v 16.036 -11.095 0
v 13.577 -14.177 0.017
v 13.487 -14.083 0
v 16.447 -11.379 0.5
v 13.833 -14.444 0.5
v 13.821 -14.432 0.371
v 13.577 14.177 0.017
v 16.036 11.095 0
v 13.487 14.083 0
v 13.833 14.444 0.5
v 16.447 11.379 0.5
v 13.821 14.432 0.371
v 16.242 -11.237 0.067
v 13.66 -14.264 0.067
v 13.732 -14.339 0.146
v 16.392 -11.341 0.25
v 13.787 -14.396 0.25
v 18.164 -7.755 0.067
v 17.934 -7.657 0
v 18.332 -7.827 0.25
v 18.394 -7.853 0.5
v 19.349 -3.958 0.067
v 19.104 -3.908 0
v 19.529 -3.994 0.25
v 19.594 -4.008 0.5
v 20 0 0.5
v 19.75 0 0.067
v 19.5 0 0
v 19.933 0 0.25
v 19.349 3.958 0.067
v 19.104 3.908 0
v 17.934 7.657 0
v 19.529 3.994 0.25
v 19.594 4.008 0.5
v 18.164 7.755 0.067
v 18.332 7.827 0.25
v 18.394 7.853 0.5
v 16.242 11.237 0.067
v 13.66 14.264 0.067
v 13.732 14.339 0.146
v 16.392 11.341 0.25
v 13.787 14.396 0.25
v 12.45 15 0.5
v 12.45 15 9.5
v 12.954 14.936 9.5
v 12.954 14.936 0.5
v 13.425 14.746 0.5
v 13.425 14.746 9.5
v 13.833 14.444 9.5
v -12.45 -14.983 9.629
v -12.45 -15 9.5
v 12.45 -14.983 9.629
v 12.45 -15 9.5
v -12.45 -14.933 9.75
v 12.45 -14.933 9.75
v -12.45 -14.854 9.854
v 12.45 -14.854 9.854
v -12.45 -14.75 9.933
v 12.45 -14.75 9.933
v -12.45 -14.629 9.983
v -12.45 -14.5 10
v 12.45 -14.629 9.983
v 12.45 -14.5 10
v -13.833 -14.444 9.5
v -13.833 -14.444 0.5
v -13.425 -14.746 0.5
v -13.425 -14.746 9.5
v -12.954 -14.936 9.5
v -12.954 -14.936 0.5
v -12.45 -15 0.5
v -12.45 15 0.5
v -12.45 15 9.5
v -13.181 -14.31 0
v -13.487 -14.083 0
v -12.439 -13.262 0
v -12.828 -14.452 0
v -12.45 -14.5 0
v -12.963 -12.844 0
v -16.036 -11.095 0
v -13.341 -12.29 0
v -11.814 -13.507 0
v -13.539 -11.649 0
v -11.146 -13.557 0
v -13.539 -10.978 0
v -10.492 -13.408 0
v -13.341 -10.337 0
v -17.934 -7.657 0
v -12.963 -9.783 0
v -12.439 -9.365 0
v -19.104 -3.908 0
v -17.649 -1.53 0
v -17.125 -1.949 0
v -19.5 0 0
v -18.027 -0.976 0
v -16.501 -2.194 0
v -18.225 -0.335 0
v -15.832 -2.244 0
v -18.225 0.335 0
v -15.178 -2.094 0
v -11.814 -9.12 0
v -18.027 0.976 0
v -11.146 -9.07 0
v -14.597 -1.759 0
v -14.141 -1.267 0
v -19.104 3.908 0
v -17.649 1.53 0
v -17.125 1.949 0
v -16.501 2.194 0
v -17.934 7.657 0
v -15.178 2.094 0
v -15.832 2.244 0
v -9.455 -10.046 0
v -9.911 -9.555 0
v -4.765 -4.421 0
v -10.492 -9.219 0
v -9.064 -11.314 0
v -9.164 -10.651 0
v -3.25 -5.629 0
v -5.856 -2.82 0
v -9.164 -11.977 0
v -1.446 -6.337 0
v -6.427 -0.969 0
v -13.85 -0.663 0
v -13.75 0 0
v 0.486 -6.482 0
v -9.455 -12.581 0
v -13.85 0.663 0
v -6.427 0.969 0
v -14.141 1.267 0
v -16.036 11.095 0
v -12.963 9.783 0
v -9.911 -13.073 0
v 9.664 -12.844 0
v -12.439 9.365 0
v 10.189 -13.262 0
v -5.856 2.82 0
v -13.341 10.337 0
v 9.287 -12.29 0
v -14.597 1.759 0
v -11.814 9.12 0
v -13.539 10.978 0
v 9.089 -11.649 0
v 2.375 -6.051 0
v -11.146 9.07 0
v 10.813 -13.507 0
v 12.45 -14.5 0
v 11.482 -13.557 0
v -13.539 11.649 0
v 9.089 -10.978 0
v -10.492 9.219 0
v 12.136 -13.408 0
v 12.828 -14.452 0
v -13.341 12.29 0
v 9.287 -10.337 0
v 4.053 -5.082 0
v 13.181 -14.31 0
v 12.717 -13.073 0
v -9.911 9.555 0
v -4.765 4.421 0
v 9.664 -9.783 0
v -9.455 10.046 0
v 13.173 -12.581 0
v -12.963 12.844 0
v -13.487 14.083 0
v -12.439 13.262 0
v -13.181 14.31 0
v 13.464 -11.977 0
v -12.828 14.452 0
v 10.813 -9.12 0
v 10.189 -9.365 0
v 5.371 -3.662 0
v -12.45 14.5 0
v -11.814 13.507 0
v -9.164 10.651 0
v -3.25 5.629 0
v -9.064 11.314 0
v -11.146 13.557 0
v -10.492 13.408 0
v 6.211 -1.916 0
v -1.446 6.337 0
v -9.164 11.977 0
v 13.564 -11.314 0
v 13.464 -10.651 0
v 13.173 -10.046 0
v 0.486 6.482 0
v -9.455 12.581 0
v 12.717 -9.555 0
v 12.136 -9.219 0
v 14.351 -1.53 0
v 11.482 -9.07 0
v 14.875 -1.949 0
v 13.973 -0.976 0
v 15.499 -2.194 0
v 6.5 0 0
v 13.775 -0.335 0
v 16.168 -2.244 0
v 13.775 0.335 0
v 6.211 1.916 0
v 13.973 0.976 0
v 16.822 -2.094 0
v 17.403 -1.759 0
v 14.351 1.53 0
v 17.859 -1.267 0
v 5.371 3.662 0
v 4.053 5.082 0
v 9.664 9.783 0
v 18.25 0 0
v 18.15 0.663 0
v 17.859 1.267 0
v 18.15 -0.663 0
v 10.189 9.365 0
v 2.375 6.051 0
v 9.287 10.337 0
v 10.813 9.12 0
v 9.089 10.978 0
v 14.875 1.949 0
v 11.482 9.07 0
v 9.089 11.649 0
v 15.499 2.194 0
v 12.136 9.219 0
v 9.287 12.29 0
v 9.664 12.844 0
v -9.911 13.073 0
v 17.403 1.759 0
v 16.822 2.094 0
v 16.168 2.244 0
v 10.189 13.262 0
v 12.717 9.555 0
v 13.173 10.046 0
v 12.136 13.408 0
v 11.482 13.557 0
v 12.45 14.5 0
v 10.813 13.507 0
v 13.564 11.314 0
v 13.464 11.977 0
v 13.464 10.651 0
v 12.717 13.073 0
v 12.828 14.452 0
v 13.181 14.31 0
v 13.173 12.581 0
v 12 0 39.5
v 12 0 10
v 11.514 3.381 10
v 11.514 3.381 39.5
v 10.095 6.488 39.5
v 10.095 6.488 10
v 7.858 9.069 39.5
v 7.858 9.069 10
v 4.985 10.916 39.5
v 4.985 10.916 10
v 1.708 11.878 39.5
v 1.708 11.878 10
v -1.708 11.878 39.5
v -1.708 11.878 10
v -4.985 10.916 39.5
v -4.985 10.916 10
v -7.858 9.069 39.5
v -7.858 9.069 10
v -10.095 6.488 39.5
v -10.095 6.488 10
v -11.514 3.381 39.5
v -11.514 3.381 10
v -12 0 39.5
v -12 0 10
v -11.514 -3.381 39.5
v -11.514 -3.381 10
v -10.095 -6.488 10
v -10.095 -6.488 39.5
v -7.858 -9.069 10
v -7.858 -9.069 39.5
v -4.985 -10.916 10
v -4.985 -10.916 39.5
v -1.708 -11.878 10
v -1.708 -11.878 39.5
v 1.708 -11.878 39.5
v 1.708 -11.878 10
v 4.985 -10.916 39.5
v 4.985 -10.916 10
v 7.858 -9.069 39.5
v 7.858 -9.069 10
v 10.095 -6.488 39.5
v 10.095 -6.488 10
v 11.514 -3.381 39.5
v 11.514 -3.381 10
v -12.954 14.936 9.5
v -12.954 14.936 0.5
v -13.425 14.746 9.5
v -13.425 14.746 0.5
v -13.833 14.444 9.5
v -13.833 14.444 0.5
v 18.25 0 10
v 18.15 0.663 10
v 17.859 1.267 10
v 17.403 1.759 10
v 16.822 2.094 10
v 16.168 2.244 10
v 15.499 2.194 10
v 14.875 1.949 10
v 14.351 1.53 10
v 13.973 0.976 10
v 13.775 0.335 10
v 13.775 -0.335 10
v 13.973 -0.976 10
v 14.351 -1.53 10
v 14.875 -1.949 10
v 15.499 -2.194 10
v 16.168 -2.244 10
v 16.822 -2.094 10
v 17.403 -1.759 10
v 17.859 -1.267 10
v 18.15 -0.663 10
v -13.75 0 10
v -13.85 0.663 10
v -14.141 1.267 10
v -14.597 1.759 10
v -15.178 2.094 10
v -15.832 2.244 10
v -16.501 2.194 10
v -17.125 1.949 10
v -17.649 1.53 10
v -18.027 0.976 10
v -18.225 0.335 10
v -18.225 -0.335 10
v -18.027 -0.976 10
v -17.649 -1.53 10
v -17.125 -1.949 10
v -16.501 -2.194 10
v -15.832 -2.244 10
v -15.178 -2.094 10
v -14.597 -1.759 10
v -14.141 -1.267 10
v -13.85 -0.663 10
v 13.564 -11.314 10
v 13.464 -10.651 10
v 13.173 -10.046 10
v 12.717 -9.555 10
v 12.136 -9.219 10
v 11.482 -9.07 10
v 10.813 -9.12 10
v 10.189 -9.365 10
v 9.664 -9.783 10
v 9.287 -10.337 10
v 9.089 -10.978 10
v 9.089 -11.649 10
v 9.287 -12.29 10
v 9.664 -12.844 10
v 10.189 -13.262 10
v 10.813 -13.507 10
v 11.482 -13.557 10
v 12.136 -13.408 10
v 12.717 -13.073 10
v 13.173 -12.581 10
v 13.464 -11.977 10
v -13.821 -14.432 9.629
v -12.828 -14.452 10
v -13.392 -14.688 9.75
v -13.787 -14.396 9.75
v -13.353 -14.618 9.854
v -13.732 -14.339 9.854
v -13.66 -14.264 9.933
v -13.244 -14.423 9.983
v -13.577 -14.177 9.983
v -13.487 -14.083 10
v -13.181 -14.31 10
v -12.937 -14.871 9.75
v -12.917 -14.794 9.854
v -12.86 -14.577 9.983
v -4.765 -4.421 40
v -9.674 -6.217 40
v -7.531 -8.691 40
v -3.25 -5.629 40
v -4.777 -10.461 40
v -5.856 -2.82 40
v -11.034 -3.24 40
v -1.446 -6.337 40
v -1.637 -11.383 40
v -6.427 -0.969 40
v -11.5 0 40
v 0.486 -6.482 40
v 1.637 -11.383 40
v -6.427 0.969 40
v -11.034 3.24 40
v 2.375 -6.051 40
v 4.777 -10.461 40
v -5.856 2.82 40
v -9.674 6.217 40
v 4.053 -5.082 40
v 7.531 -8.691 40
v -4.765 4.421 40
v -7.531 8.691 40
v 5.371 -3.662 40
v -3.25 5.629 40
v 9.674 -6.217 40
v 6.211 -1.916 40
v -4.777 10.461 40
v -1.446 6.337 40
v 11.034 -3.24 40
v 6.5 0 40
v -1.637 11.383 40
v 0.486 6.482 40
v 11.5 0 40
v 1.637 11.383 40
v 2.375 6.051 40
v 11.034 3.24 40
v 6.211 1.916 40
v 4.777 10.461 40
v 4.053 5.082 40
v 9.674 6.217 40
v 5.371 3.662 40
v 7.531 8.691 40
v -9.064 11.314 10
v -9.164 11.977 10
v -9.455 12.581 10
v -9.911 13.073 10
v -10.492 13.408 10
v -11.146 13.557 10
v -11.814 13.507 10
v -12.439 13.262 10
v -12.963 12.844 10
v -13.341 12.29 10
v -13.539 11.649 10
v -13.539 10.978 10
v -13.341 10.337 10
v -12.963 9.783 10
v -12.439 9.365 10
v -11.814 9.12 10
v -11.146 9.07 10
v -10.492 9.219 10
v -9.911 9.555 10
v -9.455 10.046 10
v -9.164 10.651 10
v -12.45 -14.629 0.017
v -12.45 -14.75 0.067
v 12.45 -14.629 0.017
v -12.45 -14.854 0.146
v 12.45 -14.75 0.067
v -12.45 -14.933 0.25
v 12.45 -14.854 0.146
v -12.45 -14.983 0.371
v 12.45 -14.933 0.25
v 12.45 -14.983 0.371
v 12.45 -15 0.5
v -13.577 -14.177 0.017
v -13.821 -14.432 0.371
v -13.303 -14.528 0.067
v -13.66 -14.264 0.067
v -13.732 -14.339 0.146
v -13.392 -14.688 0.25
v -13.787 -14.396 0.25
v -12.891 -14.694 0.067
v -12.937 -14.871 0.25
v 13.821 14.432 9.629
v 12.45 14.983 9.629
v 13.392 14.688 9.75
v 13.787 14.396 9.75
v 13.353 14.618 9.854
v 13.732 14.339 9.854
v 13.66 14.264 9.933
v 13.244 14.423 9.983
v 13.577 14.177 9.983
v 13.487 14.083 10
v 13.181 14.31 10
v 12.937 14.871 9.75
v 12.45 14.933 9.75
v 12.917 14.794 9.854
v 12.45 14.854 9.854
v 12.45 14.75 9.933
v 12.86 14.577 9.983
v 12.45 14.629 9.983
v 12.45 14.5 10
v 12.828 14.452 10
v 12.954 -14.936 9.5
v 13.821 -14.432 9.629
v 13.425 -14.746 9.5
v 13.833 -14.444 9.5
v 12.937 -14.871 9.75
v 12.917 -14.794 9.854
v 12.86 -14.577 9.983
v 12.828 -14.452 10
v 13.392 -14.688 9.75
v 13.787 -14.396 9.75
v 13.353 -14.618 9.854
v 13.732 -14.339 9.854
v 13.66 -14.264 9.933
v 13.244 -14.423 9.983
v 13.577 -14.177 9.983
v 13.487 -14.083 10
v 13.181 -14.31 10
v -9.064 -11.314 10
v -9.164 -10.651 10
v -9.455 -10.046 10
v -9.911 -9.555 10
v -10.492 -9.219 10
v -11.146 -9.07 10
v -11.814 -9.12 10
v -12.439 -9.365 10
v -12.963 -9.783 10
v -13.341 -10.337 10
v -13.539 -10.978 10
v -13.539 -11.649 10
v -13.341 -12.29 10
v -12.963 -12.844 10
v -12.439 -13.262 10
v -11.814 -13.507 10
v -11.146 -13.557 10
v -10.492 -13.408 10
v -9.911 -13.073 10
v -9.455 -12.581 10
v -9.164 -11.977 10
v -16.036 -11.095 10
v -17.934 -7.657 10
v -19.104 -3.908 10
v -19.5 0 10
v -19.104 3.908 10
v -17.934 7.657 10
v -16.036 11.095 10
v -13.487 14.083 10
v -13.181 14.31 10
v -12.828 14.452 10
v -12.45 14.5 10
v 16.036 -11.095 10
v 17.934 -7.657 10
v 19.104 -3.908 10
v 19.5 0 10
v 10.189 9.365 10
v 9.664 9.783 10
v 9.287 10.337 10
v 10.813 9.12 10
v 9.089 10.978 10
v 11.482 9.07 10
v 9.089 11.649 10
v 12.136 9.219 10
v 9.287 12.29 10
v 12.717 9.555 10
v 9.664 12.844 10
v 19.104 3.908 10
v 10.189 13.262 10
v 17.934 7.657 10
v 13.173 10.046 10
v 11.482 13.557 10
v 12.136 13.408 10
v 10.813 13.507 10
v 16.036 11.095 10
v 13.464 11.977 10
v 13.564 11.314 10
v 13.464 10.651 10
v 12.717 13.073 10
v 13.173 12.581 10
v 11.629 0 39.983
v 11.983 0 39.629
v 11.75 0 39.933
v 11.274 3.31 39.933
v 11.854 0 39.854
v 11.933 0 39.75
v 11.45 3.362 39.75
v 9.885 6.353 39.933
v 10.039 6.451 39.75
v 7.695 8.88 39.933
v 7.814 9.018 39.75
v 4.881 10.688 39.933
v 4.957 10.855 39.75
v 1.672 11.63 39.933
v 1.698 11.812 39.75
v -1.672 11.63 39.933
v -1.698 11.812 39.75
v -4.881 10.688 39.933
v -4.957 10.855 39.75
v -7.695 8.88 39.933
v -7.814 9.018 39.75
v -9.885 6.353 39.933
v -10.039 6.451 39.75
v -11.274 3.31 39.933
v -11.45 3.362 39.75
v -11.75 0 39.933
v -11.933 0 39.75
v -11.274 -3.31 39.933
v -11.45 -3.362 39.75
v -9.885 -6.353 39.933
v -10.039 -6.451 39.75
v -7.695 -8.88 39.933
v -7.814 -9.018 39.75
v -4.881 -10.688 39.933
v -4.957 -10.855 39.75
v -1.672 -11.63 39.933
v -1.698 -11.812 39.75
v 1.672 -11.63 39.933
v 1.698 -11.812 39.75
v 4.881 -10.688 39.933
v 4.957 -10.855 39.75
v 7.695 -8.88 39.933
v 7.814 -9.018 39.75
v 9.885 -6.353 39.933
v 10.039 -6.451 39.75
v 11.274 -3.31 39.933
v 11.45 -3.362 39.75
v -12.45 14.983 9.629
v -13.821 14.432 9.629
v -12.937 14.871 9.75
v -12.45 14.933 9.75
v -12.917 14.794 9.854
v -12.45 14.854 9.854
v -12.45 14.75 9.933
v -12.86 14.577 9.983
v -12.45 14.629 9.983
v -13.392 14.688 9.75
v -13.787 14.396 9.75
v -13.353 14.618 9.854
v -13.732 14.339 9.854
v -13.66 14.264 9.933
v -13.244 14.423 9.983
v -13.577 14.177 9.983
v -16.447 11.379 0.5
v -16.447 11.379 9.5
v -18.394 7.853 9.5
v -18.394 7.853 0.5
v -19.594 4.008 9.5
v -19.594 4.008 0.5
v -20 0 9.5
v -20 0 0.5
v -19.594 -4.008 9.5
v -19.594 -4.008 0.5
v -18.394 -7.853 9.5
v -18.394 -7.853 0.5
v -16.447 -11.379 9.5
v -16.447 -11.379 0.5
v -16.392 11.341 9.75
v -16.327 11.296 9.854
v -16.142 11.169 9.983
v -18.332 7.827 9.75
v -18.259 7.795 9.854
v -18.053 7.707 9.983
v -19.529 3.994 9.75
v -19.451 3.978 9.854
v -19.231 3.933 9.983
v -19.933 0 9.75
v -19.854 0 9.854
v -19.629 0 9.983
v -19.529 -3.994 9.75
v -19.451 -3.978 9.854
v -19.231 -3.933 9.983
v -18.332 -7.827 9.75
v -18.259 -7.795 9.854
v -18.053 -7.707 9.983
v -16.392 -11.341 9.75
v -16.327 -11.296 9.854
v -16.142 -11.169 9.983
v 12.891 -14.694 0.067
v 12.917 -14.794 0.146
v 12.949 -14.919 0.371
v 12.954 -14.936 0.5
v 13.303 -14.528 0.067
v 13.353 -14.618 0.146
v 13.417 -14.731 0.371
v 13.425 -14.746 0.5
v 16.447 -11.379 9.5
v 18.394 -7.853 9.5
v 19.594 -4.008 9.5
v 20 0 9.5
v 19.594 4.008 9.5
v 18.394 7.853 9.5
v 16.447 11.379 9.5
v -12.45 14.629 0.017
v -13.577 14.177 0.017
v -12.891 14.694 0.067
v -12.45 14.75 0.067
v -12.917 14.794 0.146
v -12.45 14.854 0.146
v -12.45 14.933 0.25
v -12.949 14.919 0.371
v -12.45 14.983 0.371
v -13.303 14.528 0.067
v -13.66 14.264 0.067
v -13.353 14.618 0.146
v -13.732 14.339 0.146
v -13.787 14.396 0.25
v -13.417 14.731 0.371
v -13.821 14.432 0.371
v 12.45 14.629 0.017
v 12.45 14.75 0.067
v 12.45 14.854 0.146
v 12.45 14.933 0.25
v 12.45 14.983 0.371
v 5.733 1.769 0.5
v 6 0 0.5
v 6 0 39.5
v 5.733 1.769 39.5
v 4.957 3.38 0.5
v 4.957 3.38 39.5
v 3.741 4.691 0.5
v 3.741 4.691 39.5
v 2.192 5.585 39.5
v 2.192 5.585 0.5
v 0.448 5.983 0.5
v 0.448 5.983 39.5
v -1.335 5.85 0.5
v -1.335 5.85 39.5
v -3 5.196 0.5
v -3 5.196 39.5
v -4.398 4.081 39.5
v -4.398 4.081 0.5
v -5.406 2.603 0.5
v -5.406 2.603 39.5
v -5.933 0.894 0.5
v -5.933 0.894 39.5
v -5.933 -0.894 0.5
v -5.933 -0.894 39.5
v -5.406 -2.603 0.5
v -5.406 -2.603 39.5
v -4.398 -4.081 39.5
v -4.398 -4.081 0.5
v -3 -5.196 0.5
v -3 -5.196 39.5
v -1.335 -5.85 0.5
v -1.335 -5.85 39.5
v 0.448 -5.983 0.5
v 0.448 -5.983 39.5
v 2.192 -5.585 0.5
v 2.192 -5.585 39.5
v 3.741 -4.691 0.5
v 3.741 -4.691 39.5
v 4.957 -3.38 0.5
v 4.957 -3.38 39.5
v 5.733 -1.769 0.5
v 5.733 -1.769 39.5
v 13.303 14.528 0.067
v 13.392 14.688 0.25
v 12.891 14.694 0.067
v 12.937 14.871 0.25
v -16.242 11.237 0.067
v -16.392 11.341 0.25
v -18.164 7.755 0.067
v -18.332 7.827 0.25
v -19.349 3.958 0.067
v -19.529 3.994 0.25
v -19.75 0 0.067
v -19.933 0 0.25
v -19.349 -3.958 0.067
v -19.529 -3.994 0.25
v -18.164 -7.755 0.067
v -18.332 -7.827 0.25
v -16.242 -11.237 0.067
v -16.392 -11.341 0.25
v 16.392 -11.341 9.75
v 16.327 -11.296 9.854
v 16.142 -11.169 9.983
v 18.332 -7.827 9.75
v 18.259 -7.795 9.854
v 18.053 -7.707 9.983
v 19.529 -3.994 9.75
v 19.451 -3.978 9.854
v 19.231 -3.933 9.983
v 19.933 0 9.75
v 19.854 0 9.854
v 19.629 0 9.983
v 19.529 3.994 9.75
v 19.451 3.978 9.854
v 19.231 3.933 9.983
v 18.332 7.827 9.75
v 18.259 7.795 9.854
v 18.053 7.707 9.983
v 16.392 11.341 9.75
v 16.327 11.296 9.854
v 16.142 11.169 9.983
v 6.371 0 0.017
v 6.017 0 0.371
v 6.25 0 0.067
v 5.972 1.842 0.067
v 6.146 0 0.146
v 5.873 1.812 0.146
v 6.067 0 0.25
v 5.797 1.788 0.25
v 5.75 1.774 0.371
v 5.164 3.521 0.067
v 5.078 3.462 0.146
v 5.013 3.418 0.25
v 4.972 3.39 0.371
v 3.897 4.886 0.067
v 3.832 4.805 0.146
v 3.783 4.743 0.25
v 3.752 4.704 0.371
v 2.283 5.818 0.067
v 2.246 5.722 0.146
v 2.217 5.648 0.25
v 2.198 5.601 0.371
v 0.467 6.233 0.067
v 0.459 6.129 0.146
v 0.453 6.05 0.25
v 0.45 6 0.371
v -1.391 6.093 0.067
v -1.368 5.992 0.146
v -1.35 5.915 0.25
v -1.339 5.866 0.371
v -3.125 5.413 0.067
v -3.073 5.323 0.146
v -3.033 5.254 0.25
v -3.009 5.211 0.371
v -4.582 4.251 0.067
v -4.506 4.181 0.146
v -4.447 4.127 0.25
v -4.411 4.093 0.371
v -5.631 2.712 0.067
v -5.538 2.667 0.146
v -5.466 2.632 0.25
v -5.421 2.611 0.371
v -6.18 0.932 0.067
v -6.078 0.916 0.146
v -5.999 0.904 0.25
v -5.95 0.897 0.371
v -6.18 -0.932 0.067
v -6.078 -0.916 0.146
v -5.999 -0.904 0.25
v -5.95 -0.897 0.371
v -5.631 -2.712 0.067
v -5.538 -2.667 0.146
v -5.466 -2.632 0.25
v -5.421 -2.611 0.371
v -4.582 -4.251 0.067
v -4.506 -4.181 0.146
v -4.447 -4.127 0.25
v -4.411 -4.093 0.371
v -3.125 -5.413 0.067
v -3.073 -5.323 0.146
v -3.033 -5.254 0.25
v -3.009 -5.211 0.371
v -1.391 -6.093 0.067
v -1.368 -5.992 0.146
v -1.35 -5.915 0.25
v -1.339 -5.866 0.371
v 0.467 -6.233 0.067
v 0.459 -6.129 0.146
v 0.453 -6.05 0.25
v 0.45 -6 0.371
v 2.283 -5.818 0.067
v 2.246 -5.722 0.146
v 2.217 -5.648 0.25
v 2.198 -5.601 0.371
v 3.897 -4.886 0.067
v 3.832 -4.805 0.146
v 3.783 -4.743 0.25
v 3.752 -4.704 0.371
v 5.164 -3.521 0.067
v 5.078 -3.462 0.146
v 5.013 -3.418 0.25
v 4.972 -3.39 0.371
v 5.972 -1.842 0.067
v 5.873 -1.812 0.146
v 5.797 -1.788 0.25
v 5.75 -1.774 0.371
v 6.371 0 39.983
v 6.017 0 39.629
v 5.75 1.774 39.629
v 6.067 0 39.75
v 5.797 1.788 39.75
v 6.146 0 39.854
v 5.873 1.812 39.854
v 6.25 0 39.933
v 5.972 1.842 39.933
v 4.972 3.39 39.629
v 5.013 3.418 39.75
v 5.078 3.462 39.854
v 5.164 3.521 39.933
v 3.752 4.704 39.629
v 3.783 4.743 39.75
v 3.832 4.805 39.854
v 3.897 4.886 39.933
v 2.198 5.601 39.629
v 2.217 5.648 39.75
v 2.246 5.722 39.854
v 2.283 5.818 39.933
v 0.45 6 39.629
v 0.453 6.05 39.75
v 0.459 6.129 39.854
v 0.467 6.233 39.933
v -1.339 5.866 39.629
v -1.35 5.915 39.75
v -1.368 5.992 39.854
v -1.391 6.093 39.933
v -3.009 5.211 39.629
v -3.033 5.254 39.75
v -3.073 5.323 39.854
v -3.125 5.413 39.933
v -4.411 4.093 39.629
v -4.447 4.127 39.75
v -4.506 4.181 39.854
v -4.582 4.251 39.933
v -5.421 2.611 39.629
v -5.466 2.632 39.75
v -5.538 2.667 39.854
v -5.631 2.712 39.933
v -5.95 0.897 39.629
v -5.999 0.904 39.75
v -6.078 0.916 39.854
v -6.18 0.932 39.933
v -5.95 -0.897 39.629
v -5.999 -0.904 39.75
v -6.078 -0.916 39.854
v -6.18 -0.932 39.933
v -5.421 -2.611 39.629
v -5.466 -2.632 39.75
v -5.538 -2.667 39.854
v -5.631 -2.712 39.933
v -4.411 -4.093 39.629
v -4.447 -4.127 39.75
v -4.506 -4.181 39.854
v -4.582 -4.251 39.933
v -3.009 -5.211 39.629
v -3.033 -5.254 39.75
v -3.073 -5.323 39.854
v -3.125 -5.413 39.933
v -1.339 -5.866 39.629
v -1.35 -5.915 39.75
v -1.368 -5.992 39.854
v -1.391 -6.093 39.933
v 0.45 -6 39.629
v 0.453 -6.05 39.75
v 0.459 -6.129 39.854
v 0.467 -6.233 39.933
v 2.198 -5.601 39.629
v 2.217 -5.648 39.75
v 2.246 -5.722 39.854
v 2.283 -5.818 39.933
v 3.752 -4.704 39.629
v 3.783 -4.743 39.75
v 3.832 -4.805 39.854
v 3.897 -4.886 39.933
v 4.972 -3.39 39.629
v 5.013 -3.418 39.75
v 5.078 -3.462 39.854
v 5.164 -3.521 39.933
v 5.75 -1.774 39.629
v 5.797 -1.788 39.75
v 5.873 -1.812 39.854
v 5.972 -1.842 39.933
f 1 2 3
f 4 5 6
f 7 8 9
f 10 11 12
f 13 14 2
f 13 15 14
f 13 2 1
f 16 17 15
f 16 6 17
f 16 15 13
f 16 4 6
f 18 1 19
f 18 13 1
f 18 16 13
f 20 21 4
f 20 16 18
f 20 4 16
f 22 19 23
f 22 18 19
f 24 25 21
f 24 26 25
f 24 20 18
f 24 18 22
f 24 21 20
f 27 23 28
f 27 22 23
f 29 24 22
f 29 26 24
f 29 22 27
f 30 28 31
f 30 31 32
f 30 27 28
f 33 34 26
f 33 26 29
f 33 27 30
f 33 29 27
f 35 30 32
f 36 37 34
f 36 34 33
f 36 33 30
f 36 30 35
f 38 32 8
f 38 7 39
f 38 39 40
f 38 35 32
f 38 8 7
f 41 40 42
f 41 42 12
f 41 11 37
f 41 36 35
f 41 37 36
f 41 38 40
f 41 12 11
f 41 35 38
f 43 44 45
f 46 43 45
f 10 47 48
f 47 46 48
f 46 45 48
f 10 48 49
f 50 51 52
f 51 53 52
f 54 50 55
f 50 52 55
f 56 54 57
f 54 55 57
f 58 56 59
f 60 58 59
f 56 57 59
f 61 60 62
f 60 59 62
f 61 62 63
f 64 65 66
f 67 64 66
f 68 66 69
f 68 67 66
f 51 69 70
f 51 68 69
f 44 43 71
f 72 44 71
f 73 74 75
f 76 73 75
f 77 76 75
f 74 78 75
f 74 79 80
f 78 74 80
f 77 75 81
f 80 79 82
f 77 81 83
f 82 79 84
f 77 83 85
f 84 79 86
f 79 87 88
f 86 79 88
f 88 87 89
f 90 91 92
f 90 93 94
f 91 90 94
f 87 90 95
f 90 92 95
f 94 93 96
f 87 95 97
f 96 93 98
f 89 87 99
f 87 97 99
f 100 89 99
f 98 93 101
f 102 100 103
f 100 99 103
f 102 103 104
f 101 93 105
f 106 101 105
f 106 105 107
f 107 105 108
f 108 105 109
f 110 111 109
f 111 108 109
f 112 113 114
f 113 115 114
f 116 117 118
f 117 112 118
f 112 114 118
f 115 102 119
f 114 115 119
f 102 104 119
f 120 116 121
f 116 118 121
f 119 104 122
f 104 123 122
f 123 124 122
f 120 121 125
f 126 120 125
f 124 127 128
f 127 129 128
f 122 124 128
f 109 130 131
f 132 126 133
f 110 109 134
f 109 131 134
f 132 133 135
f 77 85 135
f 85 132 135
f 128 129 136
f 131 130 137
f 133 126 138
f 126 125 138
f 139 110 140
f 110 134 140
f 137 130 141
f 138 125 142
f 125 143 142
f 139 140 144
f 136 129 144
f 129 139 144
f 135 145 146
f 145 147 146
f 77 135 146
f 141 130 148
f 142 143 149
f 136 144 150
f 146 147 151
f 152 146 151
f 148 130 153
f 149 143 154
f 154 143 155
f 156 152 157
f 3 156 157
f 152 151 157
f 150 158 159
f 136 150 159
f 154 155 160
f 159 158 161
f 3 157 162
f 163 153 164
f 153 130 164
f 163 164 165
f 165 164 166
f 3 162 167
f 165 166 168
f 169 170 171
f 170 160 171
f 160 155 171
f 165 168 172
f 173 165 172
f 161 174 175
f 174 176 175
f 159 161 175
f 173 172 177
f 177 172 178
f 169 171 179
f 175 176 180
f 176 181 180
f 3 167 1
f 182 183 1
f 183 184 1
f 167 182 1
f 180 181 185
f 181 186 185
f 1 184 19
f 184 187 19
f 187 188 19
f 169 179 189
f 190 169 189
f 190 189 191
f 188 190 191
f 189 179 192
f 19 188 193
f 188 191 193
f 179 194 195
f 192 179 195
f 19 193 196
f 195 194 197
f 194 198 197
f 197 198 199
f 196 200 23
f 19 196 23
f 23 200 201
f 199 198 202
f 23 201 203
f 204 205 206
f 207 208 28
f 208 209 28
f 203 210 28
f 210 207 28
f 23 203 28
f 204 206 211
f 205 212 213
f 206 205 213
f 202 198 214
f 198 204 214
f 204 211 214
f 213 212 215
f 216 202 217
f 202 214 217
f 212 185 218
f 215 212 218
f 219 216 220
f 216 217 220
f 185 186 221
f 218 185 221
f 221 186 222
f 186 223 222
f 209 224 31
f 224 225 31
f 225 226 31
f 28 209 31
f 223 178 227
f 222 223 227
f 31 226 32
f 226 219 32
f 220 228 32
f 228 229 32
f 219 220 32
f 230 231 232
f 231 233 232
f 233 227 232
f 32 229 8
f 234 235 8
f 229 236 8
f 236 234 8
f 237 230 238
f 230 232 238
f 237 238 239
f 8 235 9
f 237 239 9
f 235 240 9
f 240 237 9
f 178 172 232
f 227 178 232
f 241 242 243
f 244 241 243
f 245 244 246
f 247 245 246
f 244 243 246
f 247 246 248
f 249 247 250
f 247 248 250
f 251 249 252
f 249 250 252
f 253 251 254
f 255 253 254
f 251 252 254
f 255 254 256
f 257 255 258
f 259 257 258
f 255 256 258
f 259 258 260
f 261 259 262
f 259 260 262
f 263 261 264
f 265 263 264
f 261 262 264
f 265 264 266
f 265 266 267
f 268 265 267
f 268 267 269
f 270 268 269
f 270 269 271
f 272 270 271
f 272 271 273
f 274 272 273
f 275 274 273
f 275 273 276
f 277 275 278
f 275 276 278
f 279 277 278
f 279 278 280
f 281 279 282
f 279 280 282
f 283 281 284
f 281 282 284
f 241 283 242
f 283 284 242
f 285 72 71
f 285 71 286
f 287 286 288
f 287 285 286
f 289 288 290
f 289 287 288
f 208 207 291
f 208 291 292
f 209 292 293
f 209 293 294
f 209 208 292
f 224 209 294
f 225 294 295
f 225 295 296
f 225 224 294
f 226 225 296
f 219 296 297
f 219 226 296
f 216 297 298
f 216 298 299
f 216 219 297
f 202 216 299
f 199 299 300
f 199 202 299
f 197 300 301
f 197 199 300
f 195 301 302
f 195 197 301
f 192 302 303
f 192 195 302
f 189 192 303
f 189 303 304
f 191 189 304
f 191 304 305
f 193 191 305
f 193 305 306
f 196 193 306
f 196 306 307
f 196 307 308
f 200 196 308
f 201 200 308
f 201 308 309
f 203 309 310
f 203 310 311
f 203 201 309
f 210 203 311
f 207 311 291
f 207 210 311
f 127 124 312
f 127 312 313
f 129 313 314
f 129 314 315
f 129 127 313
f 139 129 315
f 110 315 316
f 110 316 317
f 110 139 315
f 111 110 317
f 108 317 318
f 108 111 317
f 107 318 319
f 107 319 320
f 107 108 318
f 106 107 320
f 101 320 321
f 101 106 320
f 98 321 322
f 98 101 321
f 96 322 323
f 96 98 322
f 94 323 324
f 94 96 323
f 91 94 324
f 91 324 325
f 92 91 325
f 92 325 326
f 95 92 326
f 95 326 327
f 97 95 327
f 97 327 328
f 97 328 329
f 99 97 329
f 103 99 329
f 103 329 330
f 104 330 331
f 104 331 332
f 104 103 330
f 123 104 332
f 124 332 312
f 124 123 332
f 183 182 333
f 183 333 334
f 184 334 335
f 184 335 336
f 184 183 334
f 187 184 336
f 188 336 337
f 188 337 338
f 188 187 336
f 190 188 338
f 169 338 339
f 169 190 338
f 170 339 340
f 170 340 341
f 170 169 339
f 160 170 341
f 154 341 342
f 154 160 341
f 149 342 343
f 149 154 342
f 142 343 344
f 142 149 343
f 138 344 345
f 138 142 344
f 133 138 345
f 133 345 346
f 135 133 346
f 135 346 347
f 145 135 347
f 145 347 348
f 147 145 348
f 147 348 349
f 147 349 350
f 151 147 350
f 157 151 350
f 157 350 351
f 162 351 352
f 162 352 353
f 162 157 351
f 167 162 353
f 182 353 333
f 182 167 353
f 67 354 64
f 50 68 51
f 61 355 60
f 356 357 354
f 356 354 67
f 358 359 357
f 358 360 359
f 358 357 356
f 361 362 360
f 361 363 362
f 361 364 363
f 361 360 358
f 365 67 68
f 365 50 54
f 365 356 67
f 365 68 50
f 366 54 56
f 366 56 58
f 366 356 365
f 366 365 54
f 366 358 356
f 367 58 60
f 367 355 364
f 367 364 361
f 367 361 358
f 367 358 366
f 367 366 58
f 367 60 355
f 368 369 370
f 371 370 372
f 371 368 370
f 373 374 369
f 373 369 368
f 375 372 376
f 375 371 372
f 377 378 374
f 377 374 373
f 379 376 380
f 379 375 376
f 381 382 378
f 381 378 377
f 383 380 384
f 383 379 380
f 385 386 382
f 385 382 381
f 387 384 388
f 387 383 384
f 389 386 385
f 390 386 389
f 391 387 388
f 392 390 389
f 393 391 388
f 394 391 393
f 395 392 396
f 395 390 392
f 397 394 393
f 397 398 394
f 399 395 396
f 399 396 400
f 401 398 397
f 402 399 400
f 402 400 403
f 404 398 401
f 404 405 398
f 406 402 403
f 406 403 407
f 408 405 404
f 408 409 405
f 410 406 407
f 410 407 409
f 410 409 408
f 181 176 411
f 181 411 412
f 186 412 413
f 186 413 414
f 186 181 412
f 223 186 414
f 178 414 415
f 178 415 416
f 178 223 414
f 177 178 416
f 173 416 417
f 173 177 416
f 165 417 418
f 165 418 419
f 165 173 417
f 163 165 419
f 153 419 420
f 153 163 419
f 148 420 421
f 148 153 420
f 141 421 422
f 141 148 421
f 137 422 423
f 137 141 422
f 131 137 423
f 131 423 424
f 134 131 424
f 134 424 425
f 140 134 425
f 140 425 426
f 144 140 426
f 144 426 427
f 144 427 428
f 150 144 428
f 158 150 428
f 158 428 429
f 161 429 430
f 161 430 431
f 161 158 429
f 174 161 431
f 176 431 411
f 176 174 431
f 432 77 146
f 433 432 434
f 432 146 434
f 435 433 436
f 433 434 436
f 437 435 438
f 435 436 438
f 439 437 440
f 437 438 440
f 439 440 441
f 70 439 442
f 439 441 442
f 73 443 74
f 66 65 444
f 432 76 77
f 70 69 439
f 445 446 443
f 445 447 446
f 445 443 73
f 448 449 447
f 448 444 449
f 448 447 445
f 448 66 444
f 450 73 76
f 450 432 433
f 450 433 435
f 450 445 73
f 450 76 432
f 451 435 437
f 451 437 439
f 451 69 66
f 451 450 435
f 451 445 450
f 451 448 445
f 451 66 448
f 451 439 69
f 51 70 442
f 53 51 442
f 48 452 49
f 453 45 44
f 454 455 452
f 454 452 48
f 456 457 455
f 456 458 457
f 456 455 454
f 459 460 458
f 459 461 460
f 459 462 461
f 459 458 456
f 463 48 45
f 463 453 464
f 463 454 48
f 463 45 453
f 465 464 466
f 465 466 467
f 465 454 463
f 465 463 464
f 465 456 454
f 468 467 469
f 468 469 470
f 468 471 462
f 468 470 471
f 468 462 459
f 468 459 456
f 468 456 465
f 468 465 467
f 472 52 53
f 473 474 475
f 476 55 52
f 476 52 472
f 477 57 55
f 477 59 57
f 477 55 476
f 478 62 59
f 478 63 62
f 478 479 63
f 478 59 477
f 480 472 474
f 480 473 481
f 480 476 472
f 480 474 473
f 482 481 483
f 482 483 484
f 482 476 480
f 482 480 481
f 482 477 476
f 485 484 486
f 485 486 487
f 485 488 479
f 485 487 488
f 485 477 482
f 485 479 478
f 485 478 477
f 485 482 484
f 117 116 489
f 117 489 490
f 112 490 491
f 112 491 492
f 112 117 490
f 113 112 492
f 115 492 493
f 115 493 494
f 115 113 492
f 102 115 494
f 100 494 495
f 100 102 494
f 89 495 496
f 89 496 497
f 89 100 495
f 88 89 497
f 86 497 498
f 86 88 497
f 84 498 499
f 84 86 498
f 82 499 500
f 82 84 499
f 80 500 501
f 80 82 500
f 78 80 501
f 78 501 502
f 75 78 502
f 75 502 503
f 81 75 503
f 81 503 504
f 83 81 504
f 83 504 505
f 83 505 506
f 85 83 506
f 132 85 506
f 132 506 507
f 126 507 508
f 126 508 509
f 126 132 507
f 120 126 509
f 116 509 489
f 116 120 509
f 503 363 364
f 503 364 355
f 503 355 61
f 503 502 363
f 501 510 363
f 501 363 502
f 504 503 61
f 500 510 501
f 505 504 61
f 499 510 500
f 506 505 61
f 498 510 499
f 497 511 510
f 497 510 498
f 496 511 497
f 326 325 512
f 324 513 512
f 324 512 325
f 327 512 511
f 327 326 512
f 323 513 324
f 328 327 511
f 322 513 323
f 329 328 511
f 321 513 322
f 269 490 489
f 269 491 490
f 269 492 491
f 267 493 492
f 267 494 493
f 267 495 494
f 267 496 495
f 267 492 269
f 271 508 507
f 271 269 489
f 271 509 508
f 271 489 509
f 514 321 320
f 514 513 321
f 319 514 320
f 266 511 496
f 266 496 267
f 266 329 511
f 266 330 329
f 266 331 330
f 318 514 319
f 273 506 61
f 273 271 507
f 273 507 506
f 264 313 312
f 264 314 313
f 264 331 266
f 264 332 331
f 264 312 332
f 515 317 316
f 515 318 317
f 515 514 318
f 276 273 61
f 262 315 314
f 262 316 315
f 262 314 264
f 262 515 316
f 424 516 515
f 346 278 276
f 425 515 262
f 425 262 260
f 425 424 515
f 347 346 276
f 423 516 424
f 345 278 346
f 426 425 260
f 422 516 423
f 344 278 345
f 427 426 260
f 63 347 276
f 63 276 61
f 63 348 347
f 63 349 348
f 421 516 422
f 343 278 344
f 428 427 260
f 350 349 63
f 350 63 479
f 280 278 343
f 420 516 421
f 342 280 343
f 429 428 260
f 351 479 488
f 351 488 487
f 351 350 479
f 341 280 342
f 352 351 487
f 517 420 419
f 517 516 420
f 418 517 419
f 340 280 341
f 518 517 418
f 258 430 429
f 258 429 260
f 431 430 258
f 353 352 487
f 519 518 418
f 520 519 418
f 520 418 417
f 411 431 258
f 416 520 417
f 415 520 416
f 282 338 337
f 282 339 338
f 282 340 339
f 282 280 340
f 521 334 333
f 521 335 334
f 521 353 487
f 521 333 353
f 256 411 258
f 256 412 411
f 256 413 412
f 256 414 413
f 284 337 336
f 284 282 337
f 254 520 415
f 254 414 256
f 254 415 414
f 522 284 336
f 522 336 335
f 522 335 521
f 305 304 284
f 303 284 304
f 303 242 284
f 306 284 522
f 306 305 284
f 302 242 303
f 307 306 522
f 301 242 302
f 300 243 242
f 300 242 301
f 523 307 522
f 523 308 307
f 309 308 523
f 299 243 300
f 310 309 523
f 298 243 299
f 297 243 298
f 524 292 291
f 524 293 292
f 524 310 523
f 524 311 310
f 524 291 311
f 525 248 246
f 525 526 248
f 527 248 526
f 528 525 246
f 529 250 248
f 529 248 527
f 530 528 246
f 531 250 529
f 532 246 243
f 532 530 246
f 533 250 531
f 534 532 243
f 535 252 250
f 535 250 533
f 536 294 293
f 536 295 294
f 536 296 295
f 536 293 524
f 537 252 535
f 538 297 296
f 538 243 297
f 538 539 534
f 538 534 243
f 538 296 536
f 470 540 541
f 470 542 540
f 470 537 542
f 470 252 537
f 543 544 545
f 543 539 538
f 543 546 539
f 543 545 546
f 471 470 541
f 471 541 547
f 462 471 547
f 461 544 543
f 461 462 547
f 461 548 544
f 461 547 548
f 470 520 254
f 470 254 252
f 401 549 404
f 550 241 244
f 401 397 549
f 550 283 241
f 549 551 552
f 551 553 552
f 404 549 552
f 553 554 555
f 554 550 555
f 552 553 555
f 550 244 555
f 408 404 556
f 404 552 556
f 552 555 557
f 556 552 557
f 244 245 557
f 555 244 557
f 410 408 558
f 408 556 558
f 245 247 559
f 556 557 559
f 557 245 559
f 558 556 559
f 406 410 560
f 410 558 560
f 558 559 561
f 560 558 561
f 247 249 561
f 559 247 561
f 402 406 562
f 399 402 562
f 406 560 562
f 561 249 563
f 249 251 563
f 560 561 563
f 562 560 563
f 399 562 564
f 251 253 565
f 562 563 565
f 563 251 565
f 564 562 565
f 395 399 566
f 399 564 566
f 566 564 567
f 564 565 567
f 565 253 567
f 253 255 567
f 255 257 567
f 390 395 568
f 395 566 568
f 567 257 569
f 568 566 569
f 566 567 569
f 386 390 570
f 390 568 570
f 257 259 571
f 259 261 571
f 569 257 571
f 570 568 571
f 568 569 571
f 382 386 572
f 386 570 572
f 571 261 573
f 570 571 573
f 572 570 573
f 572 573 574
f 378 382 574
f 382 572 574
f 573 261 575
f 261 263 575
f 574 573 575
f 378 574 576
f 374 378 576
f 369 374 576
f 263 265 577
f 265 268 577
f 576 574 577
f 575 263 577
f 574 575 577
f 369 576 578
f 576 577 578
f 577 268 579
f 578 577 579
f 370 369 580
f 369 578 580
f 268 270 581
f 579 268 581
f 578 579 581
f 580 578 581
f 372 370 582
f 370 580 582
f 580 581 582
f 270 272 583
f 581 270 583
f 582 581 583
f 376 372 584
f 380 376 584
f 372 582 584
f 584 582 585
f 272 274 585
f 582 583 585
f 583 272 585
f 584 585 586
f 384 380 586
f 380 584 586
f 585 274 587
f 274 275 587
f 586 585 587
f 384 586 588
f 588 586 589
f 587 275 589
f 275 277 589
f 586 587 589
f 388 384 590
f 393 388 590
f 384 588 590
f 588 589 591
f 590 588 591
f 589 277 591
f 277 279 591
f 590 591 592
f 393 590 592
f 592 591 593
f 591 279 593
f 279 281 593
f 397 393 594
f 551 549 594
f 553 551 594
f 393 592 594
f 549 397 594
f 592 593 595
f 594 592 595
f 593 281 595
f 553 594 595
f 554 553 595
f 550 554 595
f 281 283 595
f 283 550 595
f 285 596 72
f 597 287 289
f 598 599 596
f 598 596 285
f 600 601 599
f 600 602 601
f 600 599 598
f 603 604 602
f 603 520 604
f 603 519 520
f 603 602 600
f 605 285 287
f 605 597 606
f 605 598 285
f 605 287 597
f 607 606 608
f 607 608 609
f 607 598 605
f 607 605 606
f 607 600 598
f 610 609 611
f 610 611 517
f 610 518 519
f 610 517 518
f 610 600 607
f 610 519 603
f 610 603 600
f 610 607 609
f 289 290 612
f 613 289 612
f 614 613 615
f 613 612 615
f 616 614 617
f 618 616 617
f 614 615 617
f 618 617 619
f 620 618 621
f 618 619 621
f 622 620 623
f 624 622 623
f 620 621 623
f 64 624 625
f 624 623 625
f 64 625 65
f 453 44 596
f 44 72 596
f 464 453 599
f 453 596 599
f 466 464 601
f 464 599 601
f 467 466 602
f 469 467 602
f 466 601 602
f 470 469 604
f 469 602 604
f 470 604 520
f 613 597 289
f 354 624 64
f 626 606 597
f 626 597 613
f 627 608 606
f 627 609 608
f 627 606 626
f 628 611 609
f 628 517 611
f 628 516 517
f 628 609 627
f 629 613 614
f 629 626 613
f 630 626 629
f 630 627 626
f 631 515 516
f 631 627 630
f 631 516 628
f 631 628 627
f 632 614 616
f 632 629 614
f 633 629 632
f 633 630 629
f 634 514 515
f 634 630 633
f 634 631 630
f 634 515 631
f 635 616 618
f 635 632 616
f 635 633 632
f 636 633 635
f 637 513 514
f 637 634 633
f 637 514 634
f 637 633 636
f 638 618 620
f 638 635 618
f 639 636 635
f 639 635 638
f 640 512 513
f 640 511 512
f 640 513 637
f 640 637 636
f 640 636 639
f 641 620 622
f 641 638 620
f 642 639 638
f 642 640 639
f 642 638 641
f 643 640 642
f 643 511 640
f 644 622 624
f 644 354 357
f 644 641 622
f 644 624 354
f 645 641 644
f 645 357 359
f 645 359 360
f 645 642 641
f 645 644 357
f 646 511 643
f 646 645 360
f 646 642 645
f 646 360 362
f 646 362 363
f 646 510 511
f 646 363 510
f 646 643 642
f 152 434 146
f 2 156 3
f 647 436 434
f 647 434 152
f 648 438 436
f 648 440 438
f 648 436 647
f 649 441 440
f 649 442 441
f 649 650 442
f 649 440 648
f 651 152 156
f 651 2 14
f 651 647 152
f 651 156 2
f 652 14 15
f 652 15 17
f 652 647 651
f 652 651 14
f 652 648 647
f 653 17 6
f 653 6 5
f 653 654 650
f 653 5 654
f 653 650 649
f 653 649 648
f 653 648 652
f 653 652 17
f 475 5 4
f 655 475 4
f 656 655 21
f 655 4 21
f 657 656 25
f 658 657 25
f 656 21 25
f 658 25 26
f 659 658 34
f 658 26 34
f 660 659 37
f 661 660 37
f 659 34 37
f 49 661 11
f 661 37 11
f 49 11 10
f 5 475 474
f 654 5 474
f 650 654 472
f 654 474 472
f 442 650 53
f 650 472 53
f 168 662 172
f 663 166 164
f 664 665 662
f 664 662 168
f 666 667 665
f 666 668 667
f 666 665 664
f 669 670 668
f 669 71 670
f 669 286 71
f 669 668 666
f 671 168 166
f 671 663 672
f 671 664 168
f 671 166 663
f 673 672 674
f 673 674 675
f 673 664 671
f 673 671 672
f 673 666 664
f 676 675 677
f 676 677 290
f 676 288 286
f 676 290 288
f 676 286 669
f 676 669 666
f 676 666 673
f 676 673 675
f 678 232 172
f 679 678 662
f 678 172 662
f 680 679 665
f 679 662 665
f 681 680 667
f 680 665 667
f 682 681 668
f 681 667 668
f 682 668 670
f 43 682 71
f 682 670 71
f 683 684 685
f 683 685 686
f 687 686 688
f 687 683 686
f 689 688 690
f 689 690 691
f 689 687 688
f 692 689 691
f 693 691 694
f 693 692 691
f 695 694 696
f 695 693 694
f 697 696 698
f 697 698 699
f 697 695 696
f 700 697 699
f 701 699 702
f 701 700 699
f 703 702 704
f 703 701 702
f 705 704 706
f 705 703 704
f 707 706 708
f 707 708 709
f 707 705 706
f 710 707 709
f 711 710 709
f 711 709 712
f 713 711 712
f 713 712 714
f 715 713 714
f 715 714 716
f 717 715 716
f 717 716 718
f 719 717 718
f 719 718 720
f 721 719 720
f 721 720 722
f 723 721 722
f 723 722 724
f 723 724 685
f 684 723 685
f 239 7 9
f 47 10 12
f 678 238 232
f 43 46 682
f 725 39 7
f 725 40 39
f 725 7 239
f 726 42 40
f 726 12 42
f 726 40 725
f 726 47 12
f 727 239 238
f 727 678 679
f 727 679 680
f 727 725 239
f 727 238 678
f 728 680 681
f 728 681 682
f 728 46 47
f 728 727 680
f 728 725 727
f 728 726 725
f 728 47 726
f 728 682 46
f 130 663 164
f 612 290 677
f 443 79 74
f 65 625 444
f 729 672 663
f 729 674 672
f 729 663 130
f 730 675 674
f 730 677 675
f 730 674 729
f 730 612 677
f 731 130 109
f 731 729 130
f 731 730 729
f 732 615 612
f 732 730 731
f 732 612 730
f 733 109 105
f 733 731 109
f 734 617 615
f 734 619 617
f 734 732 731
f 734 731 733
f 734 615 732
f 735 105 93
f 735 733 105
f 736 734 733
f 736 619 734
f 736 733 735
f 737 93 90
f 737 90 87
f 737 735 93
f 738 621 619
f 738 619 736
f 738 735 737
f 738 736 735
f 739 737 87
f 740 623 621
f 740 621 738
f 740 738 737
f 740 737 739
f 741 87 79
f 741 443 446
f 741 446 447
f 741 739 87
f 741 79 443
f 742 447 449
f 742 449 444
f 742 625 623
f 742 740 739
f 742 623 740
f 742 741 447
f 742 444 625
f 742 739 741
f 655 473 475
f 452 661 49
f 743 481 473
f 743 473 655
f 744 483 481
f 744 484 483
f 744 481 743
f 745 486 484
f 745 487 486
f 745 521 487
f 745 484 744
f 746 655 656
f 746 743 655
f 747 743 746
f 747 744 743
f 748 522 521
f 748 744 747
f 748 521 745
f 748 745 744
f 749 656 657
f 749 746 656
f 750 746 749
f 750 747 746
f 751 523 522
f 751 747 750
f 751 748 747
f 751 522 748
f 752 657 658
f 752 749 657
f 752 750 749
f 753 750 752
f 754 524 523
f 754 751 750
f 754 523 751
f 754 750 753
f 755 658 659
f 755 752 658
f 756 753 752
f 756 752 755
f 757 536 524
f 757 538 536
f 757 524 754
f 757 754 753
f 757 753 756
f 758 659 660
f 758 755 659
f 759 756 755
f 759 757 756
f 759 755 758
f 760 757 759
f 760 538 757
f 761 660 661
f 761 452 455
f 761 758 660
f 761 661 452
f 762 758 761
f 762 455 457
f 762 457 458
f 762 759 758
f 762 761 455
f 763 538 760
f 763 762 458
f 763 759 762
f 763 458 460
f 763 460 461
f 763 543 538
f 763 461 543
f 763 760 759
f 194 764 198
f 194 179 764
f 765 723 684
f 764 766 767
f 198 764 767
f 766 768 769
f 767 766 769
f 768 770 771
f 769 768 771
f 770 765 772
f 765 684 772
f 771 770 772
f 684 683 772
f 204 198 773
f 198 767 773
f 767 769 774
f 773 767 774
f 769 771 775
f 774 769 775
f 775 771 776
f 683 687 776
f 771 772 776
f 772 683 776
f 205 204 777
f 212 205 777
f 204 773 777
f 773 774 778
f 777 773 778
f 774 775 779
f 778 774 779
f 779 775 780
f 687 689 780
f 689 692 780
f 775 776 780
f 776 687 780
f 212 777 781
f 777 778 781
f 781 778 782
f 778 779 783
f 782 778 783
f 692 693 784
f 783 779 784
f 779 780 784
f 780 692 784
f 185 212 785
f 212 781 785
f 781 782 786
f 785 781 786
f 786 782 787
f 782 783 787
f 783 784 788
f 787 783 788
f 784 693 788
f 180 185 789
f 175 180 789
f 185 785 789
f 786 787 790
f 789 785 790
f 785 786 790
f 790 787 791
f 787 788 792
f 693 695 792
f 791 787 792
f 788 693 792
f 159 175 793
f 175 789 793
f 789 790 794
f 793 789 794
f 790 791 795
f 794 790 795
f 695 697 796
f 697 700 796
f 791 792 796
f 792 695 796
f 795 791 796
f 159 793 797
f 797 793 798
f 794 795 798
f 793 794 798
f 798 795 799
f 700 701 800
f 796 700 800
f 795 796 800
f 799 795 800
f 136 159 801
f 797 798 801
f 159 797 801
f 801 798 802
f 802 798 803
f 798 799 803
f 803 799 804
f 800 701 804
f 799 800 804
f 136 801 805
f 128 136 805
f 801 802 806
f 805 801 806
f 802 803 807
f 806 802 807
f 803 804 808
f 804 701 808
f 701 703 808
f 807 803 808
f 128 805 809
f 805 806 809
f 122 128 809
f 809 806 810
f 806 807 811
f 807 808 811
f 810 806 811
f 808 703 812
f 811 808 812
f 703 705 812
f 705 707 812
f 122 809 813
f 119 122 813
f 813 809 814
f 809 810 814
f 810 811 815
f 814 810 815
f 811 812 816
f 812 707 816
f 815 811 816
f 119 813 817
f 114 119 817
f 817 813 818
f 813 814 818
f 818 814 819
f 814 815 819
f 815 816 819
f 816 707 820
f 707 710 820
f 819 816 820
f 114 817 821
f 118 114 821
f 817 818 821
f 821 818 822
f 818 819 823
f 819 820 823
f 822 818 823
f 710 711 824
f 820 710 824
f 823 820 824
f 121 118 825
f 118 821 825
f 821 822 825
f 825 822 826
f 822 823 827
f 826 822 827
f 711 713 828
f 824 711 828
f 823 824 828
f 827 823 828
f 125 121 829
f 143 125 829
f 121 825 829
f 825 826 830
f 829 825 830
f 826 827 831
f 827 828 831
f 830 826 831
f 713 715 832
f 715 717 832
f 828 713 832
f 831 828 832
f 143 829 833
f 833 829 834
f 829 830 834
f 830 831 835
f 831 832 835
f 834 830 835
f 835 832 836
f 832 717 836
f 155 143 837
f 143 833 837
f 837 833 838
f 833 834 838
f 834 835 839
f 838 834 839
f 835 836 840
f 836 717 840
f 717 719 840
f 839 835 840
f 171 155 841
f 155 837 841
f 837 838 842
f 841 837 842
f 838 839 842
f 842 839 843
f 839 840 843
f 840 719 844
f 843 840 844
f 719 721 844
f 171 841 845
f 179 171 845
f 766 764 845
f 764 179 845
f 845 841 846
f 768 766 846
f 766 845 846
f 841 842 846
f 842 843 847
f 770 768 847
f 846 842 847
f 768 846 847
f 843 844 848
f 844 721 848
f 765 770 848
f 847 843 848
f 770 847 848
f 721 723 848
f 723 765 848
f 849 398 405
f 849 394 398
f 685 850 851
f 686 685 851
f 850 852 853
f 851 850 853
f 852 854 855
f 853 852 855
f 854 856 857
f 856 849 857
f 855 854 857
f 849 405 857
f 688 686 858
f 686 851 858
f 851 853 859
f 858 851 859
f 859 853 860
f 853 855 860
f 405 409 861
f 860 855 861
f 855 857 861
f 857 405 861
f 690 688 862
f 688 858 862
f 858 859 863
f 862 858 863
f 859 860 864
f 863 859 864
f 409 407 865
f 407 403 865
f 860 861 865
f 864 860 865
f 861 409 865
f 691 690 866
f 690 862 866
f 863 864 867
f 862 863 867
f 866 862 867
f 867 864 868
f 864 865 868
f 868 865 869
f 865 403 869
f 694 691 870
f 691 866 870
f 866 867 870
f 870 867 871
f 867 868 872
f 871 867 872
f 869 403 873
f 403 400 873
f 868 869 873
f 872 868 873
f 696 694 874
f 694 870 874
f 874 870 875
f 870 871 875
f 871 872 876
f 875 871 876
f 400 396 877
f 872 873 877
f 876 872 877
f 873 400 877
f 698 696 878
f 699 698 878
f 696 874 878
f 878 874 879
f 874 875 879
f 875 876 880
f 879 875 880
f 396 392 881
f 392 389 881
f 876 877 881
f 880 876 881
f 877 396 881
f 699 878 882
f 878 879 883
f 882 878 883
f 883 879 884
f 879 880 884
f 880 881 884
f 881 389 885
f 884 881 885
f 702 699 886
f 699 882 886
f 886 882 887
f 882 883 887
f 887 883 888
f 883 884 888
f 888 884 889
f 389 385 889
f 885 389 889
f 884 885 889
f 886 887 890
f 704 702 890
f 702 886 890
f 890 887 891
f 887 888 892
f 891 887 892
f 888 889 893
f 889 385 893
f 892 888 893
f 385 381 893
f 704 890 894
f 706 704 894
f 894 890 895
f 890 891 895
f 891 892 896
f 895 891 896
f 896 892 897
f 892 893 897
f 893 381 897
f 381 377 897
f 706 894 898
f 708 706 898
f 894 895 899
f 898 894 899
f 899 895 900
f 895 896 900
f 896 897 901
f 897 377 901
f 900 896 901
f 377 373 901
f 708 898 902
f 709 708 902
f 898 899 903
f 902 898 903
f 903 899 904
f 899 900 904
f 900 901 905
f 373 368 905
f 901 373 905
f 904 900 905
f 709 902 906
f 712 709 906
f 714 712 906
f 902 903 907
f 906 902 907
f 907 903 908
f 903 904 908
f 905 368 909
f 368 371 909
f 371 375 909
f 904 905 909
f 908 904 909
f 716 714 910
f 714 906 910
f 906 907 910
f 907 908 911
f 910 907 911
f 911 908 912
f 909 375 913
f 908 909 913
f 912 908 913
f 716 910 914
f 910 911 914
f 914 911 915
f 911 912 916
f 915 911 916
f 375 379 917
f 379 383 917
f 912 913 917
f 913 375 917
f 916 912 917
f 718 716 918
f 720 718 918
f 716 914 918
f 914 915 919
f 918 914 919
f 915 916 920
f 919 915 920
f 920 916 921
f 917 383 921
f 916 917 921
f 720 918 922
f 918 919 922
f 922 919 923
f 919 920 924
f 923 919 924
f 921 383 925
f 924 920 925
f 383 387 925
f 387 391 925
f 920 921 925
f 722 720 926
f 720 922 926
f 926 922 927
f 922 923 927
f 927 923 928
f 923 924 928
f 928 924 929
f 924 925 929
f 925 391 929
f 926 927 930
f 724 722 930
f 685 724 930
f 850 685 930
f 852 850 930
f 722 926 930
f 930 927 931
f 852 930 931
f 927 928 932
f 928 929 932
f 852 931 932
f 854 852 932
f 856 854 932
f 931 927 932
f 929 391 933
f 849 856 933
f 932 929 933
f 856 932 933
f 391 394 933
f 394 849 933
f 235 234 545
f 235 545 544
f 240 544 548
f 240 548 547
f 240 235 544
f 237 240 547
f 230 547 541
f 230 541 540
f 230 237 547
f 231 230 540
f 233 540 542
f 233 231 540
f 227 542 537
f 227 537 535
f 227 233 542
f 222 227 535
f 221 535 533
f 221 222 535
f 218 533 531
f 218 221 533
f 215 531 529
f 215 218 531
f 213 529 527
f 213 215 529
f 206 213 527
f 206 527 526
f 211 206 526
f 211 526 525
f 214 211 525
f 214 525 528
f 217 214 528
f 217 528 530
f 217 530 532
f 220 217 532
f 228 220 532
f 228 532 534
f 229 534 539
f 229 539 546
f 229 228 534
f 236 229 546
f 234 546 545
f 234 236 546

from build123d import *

# Parameters (mm, degrees)
F0_R     = 2.25
F0_R_2   = 6
F1_DEPTH = 10
F2_R     = 12
F2_R_2   = 6
F3_DEPTH = 30
F4_R     = 2
F5_R     = 0.5


with BuildPart() as f1:
    # F0 (on Top) → F1 (new body)
    with BuildSketch(Plane.XY):
        with BuildLine():
            Line((-13.228757, -15), (13.228757, -15))
            ThreePointArc((13.228757, -15), (20, 0), (13.228757, 15))
            Line((13.228757, 15), (-13.228757, 15))
            ThreePointArc((-13.228757, 15), (-20, 0), (-13.228757, -15))
        make_face()
        with Locations((-11.313708, -11.313708)):
            Circle(F0_R, mode=Mode.SUBTRACT)
        with Locations((-16, 0)):
            Circle(F0_R, mode=Mode.SUBTRACT)
        Circle(F0_R_2, mode=Mode.SUBTRACT)
        with Locations((11.313708, -11.313708)):
            Circle(F0_R, mode=Mode.SUBTRACT)
        with Locations((16, 0)):
            Circle(F0_R, mode=Mode.SUBTRACT)
        with Locations((-11.313708, 11.313708)):
            Circle(F0_R, mode=Mode.SUBTRACT)
        with Locations((11.313708, 11.313708)):
            Circle(F0_R, mode=Mode.SUBTRACT)
    extrude(amount=F1_DEPTH)

    # F2 (on face) → F3 (join)
    with BuildSketch(Plane.XY.offset(10)):
        Circle(F2_R)
        Circle(F2_R_2, mode=Mode.SUBTRACT)
    extrude(amount=F3_DEPTH)

    # F4
    f4_edges = [f1.edges().sort_by_distance(p)[0] for p in [
        (-13.228757, -15, 5),
        (13.228757, -15, 5),
        (13.228757, 15, 5),
        (-13.228757, 15, 5),
    ]]
    fillet(f4_edges, radius=F4_R)

    # F5
    f5_edges = [f1.edges().sort_by_distance(p)[0] for p in [
        (-12, 0, 40),
        (20, 0, 10),
        (20, 0, 0),
        (-6, 0, 40),
        (-6, 0, 0),
    ]]
    fillet(f5_edges, radius=F5_R)


solid = f1.part
